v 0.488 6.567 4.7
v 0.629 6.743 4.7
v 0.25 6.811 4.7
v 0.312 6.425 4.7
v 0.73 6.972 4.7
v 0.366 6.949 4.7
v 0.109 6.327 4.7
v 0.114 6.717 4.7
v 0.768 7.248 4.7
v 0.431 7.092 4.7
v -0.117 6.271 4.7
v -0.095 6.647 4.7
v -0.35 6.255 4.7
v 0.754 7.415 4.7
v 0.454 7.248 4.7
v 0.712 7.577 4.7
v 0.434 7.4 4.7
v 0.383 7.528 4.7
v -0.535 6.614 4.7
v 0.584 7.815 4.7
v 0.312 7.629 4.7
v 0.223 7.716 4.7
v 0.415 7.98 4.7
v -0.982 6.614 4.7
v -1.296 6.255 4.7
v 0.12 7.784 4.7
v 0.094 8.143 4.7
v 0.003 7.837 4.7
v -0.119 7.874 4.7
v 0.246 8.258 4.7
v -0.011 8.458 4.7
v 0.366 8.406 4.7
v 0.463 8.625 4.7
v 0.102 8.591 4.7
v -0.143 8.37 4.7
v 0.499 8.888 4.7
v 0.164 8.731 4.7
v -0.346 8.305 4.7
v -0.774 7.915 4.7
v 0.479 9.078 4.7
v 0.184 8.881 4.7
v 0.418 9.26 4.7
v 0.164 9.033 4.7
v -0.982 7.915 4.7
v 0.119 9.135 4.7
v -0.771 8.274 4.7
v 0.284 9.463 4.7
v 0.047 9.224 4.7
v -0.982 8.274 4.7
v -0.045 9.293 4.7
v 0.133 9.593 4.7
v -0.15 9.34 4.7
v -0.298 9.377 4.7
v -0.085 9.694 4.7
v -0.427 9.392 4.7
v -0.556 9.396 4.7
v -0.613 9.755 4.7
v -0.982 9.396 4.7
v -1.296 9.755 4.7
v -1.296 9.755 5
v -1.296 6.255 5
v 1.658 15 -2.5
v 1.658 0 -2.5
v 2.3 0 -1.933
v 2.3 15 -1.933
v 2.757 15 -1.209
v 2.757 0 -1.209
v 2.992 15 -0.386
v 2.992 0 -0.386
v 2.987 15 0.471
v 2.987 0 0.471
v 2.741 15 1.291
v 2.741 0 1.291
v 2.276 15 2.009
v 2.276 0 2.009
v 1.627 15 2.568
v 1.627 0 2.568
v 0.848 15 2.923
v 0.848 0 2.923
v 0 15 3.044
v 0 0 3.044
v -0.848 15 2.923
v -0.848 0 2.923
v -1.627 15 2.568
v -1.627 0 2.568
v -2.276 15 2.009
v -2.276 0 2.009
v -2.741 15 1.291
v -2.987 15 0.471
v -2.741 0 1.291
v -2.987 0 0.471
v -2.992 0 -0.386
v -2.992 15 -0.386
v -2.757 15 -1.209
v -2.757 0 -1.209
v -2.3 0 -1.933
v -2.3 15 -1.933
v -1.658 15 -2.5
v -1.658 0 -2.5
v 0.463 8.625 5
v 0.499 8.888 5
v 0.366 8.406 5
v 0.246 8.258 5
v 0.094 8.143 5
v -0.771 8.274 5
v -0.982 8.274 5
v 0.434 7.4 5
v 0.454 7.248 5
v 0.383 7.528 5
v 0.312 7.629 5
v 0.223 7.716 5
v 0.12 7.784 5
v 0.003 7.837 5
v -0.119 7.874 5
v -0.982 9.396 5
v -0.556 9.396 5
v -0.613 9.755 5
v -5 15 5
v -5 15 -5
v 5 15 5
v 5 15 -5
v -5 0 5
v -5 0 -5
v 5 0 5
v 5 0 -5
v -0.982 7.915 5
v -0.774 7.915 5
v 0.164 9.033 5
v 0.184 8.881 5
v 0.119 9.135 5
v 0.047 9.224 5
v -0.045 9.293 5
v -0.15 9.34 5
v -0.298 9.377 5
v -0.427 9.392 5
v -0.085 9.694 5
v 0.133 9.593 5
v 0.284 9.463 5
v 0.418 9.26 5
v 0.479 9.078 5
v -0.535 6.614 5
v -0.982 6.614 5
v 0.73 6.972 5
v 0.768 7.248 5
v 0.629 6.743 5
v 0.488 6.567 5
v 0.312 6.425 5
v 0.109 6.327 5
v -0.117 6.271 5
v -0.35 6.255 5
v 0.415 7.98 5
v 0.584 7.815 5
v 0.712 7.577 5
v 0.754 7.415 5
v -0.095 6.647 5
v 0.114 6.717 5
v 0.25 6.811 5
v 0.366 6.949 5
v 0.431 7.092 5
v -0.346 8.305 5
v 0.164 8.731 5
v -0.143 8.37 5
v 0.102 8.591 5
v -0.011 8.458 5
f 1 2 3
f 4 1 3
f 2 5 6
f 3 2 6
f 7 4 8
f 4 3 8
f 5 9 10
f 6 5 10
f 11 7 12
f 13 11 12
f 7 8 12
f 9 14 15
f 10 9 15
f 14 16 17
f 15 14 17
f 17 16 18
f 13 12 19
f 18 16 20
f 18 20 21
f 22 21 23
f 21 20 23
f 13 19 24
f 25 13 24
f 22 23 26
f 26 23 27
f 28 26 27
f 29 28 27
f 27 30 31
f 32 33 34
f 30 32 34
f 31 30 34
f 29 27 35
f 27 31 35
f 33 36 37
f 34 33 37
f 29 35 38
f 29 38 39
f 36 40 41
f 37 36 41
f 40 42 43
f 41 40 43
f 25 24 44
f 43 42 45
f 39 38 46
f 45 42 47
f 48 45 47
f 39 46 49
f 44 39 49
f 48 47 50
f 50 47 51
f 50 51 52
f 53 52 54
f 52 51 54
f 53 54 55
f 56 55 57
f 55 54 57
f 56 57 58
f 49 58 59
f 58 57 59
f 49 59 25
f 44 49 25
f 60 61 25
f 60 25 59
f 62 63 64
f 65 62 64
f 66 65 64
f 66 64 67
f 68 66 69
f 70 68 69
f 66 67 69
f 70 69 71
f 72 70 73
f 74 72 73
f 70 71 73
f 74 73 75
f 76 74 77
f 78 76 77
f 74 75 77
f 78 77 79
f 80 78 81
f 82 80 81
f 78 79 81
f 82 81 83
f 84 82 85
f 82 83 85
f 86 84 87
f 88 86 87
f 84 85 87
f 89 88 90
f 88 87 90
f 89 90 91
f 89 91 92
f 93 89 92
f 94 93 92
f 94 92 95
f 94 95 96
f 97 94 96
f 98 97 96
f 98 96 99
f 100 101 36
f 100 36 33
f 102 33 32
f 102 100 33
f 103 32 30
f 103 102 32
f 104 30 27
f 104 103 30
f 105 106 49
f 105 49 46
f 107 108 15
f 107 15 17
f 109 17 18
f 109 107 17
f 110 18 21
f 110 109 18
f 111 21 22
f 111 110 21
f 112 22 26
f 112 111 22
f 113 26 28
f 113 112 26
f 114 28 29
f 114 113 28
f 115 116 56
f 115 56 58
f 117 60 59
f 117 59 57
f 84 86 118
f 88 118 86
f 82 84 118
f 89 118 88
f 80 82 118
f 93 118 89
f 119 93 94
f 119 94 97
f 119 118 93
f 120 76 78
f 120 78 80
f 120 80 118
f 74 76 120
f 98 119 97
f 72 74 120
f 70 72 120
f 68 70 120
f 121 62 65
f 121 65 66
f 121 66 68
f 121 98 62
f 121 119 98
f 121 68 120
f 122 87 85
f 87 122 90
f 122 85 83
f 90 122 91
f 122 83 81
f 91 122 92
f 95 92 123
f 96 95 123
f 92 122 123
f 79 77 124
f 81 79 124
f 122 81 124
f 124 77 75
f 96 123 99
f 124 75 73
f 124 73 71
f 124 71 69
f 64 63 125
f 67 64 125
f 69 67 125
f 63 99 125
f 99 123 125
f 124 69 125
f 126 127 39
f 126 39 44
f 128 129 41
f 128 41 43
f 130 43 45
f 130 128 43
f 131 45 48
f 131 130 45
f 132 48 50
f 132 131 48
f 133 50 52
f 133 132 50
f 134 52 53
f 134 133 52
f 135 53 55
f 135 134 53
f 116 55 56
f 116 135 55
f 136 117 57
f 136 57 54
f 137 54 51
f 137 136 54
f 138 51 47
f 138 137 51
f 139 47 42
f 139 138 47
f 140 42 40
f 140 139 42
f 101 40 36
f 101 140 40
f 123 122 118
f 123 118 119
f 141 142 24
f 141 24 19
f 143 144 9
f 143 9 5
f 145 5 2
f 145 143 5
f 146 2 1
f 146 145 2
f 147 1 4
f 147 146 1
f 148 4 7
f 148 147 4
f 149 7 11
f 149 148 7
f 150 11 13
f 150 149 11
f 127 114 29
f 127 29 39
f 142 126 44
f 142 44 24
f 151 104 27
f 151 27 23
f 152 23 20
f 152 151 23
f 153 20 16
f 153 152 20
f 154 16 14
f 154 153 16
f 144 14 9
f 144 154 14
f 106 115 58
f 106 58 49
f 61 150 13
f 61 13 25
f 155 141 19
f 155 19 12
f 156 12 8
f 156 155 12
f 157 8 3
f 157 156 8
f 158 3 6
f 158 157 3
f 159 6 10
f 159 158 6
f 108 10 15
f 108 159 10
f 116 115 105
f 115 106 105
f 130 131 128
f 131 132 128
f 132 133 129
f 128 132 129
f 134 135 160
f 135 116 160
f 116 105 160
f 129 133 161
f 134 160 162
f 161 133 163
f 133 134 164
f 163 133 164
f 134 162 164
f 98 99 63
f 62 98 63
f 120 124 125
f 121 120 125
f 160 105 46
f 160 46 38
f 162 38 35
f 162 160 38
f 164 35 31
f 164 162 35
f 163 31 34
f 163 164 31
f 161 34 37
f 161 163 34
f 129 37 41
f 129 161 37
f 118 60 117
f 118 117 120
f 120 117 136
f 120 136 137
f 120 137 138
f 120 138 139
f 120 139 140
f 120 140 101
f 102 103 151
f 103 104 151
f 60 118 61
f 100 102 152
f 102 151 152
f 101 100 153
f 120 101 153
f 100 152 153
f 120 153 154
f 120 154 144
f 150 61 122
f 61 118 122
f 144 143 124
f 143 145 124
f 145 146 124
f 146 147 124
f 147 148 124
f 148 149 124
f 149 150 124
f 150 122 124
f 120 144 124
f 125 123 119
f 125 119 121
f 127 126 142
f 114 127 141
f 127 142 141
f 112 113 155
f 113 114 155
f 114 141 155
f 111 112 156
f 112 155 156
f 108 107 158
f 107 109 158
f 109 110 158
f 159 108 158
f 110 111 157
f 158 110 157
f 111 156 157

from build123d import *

# Parameters (mm, degrees)
SKETCH1_W           = 10
SKETCH1_H           = 10
BOSS_EXTRUDE1_DEPTH = 15
CUT_EXTRUDE1_DEPTH  = 0.3


with BuildPart() as part:
    # Sketch1 → Boss-Extrude1 (new body)
    with BuildSketch(Plane(origin=(0, 0, 0), x_dir=(1, 0, 0), z_dir=(0, 1, 0))):
        Rectangle(SKETCH1_W, SKETCH1_H)
        with BuildLine():
            Line((-1.658312395, 2.5), (1.658312395, 2.5))
            ThreePointArc((1.658312395, 2.5), (0, -3.043965134), (-1.658312395, 2.5))
        make_face(mode=Mode.SUBTRACT)
    extrude(amount=BOSS_EXTRUDE1_DEPTH)

    # Sketch2 → Cut-Extrude1 (cut)
    with BuildSketch(Plane.XY.offset(5)):
        with BuildLine():
            Line((-1.296362428, 9.754838654), (-0.6134698, 9.754838654))
            add(Edge.make_bspline(
                [(-0.6134698, 9.754838654), (-0.580041322, 9.754662904), (-0.515248611, 9.754322256), (-0.42102917, 9.749039125), (-0.332780359, 9.741835455), (-0.250476587, 9.730405362), (-0.174155884, 9.716613585), (-0.103588247, 9.699911769), (-0.038998075, 9.679885155), (0.038114662, 9.648038874), (0.126035323, 9.600715706), (0.221233715, 9.530787141), (0.302637955, 9.445254678), (0.372824272, 9.348772022), (0.428625391, 9.24263625), (0.468994689, 9.129377062), (0.494552564, 9.01045532), (0.497180998, 8.928812142), (0.498509367, 8.887550994)],
                knots=[0, 0, 0, 0, 0.00010027, 0.000194349, 0.000283026, 0.000365821, 0.000443519, 0.000515622, 0.000583254, 0.00064614, 0.000765662, 0.000881909, 0.000998927, 0.001118415, 0.001238844, 0.00135727, 0.001478274, 0.001601912, 0.001601912, 0.001601912, 0.001601912], degree=3))
            add(Edge.make_bspline(
                [(0.498509367, 8.887550994), (0.497416148, 8.848898438), (0.495267871, 8.772942521), (0.474725112, 8.661848412), (0.442564443, 8.556097193), (0.397859194, 8.456074808), (0.339757198, 8.364041195), (0.270898879, 8.279253929), (0.187822077, 8.205302872), (0.125578837, 8.163959969), (0.093962091, 8.142959648)],
                knots=[0, 0, 0, 0, 0.000115857, 0.00022767, 0.000337672, 0.000446877, 0.000555233, 0.000663318, 0.000773539, 0.000887324, 0.000887324, 0.000887324, 0.000887324], degree=3))
            add(Edge.make_bspline(
                [(0.093962091, 8.142959648), (0.133722519, 8.127694649), (0.209794066, 8.098488925), (0.314480078, 8.046853461), (0.404674923, 7.99069135), (0.481072069, 7.9293595), (0.546409724, 7.863250689), (0.603462666, 7.791395575), (0.65214404, 7.712856817), (0.693856964, 7.628453282), (0.72640572, 7.539046813), (0.750781624, 7.445476037), (0.764749073, 7.348076482), (0.766736714, 7.281791103), (0.767740136, 7.248328238)],
                knots=[0, 0, 0, 0, 0.000127722, 0.000244363, 0.000349599, 0.000445847, 0.000537565, 0.000627901, 0.000720503, 0.000814257, 0.000909859, 0.001005428, 0.001103887, 0.001204268, 0.001204268, 0.001204268, 0.001204268], degree=3))
            add(Edge.make_bspline(
                [(0.767740136, 7.248328238), (0.76676329, 7.214161366), (0.764841318, 7.146937088), (0.750661346, 7.048181953), (0.726652239, 6.953807006), (0.693581093, 6.863201824), (0.650418778, 6.776541689), (0.597890814, 6.693728425), (0.53525925, 6.615594095), (0.465196381, 6.541270471), (0.385934236, 6.474442684), (0.300418481, 6.414926977), (0.207572161, 6.365980915), (0.108920167, 6.324864894), (0.003355851, 6.293457695), (-0.108646757, 6.271485121), (-0.226991058, 6.256680084), (-0.308200809, 6.25546288), (-0.349848005, 6.254838654)],
                knots=[0, 0, 0, 0, 0.000102481, 0.000201635, 0.000298562, 0.000394165, 0.000490425, 0.000588455, 0.000687769, 0.000790423, 0.000894381, 0.000998232, 0.001102369, 0.001208616, 0.001318415, 0.001432129, 0.001550749, 0.00167562, 0.00167562, 0.00167562, 0.00167562], degree=3))
            Line((-0.349848005, 6.254838654), (-1.296362428, 6.254838654))
            Line((-1.296362428, 6.254838654), (-1.296362428, 9.754838654))
        make_face()
        with BuildLine():
            Line((-0.982259864, 9.395864295), (-0.982259864, 8.274069424))
            Line((-0.982259864, 8.274069424), (-0.771222204, 8.274069424))
            add(Edge.make_bspline(
                [(-0.771222204, 8.274069424), (-0.740373408, 8.274469347), (-0.680767249, 8.275242079), (-0.594447353, 8.277455596), (-0.514322334, 8.28365364), (-0.440530501, 8.289849902), (-0.373188057, 8.29992449), (-0.312444196, 8.311916612), (-0.257345599, 8.324599518), (-0.193806053, 8.346169004), (-0.121733105, 8.37804668), (-0.044900001, 8.427518516), (0.022834469, 8.486442869), (0.080031656, 8.554433831), (0.126843127, 8.629300017), (0.159356842, 8.709846897), (0.181404126, 8.794067029), (0.183395658, 8.851885282), (0.184406803, 8.881240898)],
                knots=[0, 0, 0, 0, 9.2559e-05, 0.000178842, 0.000258967, 0.000333616, 0.000400942, 0.000463093, 0.000519379, 0.000570374, 0.000664201, 0.000755025, 0.000843472, 0.000932526, 0.001020669, 0.001107124, 0.001192318, 0.001280185, 0.001280185, 0.001280185, 0.001280185], degree=3))
            add(Edge.make_bspline(
                [(0.184406803, 8.881240898), (0.183880622, 8.90066667), (0.182848462, 8.938772442), (0.17439516, 8.994321796), (0.160027585, 9.046565548), (0.141573292, 9.096219659), (0.115784603, 9.141731509), (0.08542114, 9.184674705), (0.04873545, 9.223586823), (0.006978137, 9.259956321), (-0.041030486, 9.292200849), (-0.095261777, 9.320441612), (-0.156449455, 9.343182389), (-0.223562309, 9.363098541), (-0.297633397, 9.377086835), (-0.37780795, 9.388740223), (-0.464742669, 9.394672965), (-0.524887772, 9.395458328), (-0.555977813, 9.395864295)],
                knots=[0, 0, 0, 0, 5.8261e-05, 0.000114285, 0.000168029, 0.000220632, 0.000272728, 0.000324483, 0.000378062, 0.000432741, 0.000490301, 0.000551137, 0.000615721, 0.000685833, 0.000760908, 0.00084162, 0.000928788, 0.00102206, 0.00102206, 0.00102206, 0.00102206], degree=3))
            Line((-0.555977813, 9.395864295), (-0.982259864, 9.395864295))
        make_face(mode=Mode.SUBTRACT)
        with BuildLine():
            Line((-0.982259864, 7.915095065), (-0.982259864, 6.613813013))
            Line((-0.982259864, 6.613813013), (-0.534944159, 6.613813013))
            add(Edge.make_bspline(
                [(-0.534944159, 6.613813013), (-0.502925233, 6.614196761), (-0.441212974, 6.614936383), (-0.352111744, 6.617350938), (-0.269528641, 6.622843214), (-0.193840505, 6.631489063), (-0.124230052, 6.640867512), (-0.061532349, 6.653478793), (-0.005239156, 6.667927754), (0.060035152, 6.690261926), (0.13353866, 6.724958397), (0.212749517, 6.777272623), (0.283175735, 6.839595931), (0.342980994, 6.911726845), (0.391993983, 6.990158172), (0.427649438, 7.073303522), (0.449640294, 7.15978905), (0.452302464, 7.218755762), (0.453637572, 7.248328238)],
                knots=[0, 0, 0, 0, 9.6064e-05, 0.000185151, 0.000267373, 0.000344257, 0.000413665, 0.000478015, 0.000536005, 0.000587888, 0.000684801, 0.000778918, 0.000871787, 0.000965866, 0.001059062, 0.00114827, 0.001236355, 0.001324974, 0.001324974, 0.001324974, 0.001324974], degree=3))
            add(Edge.make_bspline(
                [(0.453637572, 7.248328238), (0.453361467, 7.266821578), (0.452813712, 7.30350996), (0.444553097, 7.357425779), (0.432539228, 7.409651653), (0.417007794, 7.460329393), (0.394388327, 7.508542769), (0.367981782, 7.555245329), (0.33702038, 7.600498808), (0.288776214, 7.657711062), (0.21860423, 7.723628075), (0.118897454, 7.788165577), (0.005525156, 7.840213384), (-0.076702337, 7.86231286), (-0.119178935, 7.873728879)],
                knots=[0, 0, 0, 0, 5.5429e-05, 0.000109963, 0.000163198, 0.000216191, 0.000268588, 0.000322593, 0.000377046, 0.000432793, 0.000546889, 0.000664343, 0.000787646, 0.000919405, 0.000919405, 0.000919405, 0.000919405], degree=3))
            add(Edge.make_bspline(
                [(-0.119178935, 7.873728879), (-0.13620803, 7.877183963), (-0.173130623, 7.884675297), (-0.233338203, 7.892583001), (-0.302074072, 7.899628061), (-0.379496949, 7.904839218), (-0.46570479, 7.910225762), (-0.560881709, 7.912320583), (-0.664639024, 7.914819843), (-0.736631396, 7.915000977), (-0.774026691, 7.915095065)],
                knots=[0, 0, 0, 0, 5.2115e-05, 0.000112995, 0.000182062, 0.000259389, 0.000345767, 0.00044116, 0.000544948, 0.000657129, 0.000657129, 0.000657129, 0.000657129], degree=3))
            Line((-0.774026691, 7.915095065), (-0.982259864, 7.915095065))
        make_face(mode=Mode.SUBTRACT)
    extrude(amount=-CUT_EXTRUDE1_DEPTH, mode=Mode.SUBTRACT)


solid = part.part
